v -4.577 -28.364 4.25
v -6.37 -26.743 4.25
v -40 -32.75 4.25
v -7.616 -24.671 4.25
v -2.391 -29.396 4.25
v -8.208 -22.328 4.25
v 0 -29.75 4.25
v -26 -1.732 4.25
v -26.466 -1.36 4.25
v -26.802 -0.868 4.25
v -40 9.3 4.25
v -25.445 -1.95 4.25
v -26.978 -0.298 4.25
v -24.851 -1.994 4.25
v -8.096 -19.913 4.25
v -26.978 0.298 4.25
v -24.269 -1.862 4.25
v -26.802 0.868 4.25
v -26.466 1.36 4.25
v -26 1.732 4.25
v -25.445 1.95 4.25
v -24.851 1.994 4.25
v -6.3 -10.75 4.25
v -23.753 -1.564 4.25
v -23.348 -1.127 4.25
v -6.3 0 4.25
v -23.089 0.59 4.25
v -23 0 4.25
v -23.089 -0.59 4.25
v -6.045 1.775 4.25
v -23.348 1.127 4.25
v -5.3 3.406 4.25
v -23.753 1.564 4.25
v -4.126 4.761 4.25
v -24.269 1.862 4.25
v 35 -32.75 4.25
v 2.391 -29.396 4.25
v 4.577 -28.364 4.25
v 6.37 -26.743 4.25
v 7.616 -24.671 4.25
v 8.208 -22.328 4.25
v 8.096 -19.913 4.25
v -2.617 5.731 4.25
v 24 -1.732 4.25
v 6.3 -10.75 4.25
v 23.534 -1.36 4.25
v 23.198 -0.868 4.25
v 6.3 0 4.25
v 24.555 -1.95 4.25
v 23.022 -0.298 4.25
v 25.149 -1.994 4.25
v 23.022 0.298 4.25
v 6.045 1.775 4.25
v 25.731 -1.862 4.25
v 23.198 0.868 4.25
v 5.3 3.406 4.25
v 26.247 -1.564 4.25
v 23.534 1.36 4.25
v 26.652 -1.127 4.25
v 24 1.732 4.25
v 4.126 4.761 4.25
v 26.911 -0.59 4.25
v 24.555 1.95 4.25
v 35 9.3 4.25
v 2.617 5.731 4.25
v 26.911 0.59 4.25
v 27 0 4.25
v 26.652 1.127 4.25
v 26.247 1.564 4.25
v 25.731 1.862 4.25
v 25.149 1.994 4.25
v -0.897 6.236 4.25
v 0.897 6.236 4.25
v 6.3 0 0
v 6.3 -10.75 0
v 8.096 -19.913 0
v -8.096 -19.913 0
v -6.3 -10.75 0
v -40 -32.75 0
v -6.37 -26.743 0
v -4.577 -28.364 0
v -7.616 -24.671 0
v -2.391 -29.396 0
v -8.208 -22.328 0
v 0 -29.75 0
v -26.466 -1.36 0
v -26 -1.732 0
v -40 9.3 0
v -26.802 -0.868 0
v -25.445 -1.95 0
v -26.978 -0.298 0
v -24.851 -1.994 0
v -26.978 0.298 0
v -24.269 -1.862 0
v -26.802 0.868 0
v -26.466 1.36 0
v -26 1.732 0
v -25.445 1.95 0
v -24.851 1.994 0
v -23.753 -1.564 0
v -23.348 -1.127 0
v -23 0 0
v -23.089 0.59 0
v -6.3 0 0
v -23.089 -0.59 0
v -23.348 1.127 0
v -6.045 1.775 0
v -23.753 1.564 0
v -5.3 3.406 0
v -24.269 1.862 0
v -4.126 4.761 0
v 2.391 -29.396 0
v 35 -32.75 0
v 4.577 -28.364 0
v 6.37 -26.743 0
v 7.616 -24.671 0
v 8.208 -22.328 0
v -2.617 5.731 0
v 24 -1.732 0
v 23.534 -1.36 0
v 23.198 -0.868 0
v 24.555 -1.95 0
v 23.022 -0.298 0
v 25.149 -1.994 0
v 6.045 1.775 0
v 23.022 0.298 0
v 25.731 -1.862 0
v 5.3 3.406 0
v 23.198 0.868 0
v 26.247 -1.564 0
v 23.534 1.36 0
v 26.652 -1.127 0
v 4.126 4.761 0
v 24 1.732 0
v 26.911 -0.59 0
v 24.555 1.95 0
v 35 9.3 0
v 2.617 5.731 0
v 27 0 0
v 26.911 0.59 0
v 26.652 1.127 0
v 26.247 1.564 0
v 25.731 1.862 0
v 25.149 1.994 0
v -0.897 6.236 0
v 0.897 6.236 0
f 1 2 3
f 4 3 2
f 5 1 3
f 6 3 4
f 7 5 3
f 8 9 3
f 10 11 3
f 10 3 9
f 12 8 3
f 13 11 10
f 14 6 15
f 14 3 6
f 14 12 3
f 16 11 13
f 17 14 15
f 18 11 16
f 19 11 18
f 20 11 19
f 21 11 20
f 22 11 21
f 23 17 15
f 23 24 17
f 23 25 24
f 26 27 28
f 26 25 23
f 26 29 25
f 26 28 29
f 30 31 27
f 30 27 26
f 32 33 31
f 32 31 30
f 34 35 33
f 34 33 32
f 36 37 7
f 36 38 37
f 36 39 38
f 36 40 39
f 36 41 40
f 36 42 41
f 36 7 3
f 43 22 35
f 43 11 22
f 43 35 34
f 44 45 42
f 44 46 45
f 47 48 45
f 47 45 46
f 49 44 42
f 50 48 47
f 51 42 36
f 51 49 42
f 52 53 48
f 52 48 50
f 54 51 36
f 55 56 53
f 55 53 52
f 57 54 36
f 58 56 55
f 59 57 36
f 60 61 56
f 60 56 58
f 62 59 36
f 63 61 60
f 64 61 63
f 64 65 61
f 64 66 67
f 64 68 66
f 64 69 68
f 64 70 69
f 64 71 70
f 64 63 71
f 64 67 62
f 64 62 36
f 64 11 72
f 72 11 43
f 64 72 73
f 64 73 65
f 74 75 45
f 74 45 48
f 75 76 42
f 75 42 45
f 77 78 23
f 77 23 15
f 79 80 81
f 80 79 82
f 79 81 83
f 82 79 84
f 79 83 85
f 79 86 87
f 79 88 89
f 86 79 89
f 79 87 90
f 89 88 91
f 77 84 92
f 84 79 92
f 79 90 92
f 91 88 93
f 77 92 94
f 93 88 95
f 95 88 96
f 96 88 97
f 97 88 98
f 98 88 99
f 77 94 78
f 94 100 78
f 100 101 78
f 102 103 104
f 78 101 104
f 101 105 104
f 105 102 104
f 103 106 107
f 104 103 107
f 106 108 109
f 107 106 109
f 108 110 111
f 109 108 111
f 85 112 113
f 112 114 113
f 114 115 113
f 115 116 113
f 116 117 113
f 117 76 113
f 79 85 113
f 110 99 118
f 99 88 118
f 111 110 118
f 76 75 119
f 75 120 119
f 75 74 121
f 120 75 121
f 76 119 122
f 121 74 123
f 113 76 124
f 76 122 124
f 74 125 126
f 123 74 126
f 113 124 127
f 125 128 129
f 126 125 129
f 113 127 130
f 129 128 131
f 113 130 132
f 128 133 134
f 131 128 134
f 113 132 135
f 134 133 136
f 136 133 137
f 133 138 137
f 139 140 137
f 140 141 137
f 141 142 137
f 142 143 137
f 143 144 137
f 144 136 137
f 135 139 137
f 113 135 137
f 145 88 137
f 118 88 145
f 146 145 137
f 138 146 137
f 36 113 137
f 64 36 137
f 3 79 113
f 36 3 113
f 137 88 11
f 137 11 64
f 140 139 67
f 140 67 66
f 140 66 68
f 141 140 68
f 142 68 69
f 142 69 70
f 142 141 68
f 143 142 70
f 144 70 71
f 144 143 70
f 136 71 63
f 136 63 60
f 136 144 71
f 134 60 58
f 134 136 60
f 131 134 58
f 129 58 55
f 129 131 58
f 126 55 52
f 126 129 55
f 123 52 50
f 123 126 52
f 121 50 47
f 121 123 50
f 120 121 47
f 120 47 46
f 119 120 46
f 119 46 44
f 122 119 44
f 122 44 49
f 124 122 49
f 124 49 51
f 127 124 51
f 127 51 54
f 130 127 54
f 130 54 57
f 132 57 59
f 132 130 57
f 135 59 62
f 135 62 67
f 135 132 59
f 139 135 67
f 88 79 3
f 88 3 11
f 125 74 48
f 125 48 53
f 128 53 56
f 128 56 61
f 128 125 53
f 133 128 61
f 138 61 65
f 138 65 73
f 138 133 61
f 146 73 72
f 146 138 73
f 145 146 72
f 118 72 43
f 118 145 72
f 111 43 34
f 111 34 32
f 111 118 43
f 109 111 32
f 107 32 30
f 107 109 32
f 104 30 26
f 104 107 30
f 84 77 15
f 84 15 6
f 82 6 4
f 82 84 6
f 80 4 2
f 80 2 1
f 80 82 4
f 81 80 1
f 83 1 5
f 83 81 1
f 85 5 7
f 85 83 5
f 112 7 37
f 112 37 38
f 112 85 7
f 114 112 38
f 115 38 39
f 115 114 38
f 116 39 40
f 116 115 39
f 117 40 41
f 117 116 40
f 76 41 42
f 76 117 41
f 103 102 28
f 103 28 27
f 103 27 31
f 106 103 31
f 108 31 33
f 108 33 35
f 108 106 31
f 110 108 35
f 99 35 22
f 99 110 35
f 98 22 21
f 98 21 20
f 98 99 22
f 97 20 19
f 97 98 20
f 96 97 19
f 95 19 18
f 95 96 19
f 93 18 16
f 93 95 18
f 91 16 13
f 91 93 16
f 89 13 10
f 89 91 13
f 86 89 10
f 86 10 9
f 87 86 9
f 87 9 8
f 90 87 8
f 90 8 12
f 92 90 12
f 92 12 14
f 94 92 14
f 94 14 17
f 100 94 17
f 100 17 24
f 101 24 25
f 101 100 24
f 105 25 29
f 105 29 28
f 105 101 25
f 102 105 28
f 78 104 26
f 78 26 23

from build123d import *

# Parameters (mm, degrees)
SKETCH1_W           = 75
SKETCH1_H           = 42.05
SKETCH1_R           = 2
BOSS_EXTRUDE2_DEPTH = 4.25


with BuildPart() as part:
    # Sketch1 → Boss-Extrude2 (new body)
    with BuildSketch(Plane.XY):
        with Locations((-2.5, -11.725)):
            Rectangle(SKETCH1_W, SKETCH1_H)
        with Locations((-25, 0)):
            Circle(SKETCH1_R, mode=Mode.SUBTRACT)
        with Locations((25, 0)):
            Circle(SKETCH1_R, mode=Mode.SUBTRACT)
        with BuildLine():
            ThreePointArc((-8.09596287, -19.913215449), (0, -29.75), (8.09596287, -19.913215449))
            Line((8.09596287, -19.913215449), (6.3, -10.75))
            Line((6.3, -10.75), (6.3, 0))
            ThreePointArc((6.3, 0), (0, 6.3), (-6.3, 0))
            Line((-6.3, 0), (-6.3, -10.75))
            Line((-6.3, -10.75), (-8.09596287, -19.913215449))
        make_face(mode=Mode.SUBTRACT)
    extrude(amount=BOSS_EXTRUDE2_DEPTH)


solid = part.part
